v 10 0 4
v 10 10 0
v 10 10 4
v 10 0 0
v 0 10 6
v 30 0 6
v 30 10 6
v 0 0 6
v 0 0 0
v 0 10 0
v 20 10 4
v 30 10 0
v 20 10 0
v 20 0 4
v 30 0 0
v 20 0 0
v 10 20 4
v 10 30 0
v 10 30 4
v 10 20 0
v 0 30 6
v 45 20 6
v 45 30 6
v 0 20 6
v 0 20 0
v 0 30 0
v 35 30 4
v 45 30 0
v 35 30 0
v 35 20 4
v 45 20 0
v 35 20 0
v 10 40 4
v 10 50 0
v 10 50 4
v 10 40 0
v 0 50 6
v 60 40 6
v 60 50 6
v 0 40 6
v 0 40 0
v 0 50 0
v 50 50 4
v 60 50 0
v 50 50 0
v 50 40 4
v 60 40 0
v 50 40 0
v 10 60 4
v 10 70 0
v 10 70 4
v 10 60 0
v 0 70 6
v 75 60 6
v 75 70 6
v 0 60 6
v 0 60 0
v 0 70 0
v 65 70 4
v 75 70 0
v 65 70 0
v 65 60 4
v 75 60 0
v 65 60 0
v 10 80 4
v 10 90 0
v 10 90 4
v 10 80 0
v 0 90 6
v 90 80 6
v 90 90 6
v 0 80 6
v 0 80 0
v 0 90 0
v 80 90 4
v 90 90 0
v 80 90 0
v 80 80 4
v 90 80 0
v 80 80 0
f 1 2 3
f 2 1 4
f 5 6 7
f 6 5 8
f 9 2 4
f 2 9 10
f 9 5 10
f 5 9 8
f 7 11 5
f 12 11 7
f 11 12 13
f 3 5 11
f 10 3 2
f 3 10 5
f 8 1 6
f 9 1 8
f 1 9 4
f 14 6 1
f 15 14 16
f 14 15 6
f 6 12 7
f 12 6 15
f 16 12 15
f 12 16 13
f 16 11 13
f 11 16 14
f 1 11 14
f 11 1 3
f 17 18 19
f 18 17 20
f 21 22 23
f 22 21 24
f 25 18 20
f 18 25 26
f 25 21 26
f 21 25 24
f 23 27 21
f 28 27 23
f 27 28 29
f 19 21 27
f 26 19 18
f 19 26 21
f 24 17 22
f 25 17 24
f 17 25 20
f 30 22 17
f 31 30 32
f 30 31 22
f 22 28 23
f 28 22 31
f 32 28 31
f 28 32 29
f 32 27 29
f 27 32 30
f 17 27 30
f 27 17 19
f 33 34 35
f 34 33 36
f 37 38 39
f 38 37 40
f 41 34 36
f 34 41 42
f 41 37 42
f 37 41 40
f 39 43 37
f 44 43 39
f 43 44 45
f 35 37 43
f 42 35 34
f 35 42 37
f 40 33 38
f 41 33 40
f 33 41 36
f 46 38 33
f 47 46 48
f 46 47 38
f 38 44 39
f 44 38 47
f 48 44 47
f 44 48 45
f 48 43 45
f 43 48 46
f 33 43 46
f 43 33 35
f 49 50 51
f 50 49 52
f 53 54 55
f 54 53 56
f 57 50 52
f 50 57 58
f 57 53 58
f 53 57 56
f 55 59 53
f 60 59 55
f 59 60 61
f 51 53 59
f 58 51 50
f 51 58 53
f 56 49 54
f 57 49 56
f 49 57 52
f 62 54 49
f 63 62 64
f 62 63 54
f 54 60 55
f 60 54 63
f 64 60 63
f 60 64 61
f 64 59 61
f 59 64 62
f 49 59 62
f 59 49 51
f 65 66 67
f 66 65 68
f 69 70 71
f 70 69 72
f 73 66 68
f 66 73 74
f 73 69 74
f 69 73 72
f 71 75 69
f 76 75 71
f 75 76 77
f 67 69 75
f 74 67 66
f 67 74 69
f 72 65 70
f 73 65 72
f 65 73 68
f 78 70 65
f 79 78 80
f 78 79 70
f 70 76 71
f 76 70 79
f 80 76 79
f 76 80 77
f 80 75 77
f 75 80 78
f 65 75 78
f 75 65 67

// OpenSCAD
With=10;
Height=6;
Thickness=2;
Number=5;
//First bridge length
First_length=10;
//Increment between each bridge
Increment=15;


for(i=[0:Number-1])
{
	translate([0,i*(With+10),0])cube([With,With,Height]);
	translate([With+First_length+i*Increment,i*(With+10),0])cube([With,With,Height]);
	translate([With,i*(With+10),Height-Thickness])cube([First_length+i*Increment,With,Thickness]);
}
